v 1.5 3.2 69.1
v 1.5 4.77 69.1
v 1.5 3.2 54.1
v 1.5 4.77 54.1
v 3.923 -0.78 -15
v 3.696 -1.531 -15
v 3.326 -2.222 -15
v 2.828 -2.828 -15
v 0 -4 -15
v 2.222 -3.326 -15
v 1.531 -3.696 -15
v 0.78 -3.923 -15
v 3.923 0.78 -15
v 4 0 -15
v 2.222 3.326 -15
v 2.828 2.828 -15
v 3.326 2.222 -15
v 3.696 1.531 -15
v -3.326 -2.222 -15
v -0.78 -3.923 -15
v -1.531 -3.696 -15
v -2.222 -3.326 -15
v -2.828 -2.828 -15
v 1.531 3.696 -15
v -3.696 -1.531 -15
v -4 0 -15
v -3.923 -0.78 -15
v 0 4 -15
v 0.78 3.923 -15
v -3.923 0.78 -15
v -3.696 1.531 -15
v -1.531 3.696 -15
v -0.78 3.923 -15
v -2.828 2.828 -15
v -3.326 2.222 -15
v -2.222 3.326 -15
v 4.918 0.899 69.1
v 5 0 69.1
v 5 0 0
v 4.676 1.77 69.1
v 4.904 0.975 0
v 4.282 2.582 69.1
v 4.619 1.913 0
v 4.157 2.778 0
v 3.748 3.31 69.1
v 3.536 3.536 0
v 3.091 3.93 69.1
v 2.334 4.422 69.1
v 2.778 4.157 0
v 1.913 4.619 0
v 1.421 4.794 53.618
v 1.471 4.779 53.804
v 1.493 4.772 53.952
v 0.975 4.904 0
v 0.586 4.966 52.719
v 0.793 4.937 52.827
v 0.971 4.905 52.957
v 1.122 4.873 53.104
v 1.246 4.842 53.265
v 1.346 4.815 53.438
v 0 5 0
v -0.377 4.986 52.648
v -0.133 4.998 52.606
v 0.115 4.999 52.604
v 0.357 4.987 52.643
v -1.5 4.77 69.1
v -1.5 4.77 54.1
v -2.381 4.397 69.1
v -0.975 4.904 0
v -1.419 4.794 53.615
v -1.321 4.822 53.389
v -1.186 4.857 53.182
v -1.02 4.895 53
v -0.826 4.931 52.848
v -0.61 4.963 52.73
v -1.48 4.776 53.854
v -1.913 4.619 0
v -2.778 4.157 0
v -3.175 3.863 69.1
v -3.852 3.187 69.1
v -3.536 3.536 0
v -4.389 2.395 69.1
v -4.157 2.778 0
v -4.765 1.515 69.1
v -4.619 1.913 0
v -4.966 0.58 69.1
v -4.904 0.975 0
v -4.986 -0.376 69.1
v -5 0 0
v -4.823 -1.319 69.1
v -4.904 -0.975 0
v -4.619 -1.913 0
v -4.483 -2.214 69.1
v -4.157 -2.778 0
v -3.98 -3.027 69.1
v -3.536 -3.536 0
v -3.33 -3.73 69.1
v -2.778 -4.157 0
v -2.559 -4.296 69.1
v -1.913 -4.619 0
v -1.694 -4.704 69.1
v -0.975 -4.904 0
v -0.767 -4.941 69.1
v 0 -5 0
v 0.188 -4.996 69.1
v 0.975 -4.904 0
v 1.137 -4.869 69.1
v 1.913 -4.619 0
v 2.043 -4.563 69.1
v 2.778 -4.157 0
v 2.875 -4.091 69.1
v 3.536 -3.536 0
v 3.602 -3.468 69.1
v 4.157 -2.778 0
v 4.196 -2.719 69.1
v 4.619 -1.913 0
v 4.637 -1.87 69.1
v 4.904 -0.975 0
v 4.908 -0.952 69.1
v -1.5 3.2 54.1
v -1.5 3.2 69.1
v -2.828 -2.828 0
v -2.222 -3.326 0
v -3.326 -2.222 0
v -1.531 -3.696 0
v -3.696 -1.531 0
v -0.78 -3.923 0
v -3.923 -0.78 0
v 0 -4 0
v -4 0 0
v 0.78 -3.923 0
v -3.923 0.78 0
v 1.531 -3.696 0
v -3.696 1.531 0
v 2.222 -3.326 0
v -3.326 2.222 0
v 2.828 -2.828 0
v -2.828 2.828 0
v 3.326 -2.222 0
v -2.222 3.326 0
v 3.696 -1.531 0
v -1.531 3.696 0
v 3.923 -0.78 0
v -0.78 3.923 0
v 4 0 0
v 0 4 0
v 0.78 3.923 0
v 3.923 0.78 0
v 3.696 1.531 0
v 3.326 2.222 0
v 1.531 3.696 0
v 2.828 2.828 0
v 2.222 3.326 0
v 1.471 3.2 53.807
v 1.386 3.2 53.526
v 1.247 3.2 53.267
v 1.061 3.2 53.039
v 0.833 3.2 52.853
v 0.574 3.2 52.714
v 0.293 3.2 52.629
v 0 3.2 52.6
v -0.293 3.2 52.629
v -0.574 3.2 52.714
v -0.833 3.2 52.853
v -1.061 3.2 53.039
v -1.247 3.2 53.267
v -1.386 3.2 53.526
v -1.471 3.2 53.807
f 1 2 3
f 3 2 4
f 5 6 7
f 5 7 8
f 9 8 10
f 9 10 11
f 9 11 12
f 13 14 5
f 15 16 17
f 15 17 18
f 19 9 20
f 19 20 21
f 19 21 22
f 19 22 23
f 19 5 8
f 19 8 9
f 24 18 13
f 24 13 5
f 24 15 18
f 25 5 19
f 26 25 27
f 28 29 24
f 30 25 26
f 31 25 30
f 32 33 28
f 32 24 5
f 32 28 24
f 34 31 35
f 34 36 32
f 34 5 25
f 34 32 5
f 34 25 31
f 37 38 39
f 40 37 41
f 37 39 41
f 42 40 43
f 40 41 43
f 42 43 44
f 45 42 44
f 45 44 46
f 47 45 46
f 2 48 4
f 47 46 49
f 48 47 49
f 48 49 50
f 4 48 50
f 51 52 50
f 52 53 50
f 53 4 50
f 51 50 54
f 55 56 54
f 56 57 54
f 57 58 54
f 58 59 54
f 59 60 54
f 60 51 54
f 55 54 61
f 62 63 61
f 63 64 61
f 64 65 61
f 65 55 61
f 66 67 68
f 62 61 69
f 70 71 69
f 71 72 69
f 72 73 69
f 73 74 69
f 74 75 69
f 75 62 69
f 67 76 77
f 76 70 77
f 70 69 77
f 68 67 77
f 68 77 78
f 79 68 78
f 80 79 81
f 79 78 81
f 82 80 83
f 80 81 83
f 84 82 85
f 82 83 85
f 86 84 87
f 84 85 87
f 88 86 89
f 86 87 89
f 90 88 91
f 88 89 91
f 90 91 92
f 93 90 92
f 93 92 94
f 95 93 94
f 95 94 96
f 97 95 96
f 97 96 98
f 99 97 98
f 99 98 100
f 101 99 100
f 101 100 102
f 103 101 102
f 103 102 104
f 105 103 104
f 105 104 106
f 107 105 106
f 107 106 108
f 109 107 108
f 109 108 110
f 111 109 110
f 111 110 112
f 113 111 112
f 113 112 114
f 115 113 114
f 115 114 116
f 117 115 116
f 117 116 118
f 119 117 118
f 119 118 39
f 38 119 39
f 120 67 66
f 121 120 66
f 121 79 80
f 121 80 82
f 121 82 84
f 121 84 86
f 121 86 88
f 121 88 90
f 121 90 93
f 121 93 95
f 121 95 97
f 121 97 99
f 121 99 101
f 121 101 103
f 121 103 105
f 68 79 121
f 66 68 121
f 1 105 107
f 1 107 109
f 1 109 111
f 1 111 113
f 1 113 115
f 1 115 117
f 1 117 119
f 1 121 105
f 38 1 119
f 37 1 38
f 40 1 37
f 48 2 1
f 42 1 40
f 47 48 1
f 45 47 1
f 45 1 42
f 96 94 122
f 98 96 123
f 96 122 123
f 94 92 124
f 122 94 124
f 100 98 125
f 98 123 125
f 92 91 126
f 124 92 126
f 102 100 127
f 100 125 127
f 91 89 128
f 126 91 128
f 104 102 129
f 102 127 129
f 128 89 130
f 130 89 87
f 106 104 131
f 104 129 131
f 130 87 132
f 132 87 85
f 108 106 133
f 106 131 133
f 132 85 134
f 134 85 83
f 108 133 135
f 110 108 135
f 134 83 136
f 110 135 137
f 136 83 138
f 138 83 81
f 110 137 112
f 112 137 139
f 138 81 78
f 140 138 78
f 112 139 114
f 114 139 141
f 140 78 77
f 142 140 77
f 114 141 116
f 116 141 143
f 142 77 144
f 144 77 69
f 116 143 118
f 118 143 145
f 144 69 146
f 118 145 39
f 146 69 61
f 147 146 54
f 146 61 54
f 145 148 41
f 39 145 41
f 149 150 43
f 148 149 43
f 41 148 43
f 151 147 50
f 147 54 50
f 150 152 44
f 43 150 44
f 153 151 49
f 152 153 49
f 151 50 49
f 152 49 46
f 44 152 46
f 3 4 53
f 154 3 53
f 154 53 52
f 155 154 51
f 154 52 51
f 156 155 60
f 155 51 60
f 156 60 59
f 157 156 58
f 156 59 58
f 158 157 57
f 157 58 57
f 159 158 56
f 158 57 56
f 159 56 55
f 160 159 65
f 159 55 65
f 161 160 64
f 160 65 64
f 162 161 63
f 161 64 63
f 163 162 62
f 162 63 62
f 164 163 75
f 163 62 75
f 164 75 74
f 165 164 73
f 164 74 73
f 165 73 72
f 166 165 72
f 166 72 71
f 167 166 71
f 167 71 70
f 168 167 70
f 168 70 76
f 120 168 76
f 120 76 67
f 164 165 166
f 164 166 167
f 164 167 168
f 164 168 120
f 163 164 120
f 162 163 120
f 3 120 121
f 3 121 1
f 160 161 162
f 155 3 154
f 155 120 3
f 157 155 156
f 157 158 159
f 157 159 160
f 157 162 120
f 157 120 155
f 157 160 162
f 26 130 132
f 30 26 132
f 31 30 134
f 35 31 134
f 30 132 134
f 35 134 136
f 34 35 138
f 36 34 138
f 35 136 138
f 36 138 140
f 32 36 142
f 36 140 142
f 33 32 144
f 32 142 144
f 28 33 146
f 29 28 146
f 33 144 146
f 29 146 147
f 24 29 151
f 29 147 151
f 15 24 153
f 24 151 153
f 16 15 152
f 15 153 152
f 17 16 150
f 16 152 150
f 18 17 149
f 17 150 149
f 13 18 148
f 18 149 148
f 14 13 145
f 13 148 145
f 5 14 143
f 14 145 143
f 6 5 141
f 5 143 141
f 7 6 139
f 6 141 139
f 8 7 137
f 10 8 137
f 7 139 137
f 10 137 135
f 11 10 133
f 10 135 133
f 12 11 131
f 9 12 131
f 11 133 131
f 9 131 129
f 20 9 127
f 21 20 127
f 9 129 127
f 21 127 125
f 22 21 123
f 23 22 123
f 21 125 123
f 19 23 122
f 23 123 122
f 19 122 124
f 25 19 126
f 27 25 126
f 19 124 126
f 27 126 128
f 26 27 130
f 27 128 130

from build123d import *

# Parameters (mm, degrees)
SKETCH_1_R          = 5
EXTRUDE_1_DEPTH     = 69.1
SKETCH_3_R          = 4
EXTRUDE_3_DEPTH     = 15
CUT_EXTRUDE_1_DEPTH = 1.8


with BuildPart() as part:
    # ｽｹｯﾁ1 → ﾎﾞｽ - 押し出し1 (new body)
    with BuildSketch(Plane.XY):
        Circle(SKETCH_1_R)
    extrude(amount=EXTRUDE_1_DEPTH)

    # ｽｹｯﾁ3 → ﾎﾞｽ - 押し出し3 (add)
    with BuildSketch(Plane(origin=(0, 0, 0), x_dir=(-1, 0, 0), z_dir=(0, 0, -1))):
        Circle(SKETCH_3_R)
    extrude(amount=EXTRUDE_3_DEPTH)

    # ｽｹｯﾁ4 → ｶｯﾄ - 押し出し1 (cut)
    with BuildSketch(Plane(origin=(0, 5, 0), x_dir=(1, 0, 0), z_dir=(0, 1, 0))):
        with BuildLine():
            ThreePointArc((1.5, -54.1), (0, -52.6), (-1.5, -54.1))
            Line((-1.5, -54.1), (1.5, -54.1))
        make_face()
        with BuildLine():
            Line((1.5, -54.1), (-1.5, -54.1))
            ThreePointArc((-1.5, -54.1), (0, -55.6), (1.5, -54.1))
        make_face()
        with BuildLine():
            ThreePointArc((1.5, -54.1), (0, -55.6), (-1.5, -54.1))
            Line((-1.5, -54.1), (-1.5, -69.1))
            Line((-1.5, -69.1), (1.5, -69.1))
            Line((1.5, -69.1), (1.5, -54.1))
        make_face()
    extrude(amount=-CUT_EXTRUDE_1_DEPTH, mode=Mode.SUBTRACT)


solid = part.part
